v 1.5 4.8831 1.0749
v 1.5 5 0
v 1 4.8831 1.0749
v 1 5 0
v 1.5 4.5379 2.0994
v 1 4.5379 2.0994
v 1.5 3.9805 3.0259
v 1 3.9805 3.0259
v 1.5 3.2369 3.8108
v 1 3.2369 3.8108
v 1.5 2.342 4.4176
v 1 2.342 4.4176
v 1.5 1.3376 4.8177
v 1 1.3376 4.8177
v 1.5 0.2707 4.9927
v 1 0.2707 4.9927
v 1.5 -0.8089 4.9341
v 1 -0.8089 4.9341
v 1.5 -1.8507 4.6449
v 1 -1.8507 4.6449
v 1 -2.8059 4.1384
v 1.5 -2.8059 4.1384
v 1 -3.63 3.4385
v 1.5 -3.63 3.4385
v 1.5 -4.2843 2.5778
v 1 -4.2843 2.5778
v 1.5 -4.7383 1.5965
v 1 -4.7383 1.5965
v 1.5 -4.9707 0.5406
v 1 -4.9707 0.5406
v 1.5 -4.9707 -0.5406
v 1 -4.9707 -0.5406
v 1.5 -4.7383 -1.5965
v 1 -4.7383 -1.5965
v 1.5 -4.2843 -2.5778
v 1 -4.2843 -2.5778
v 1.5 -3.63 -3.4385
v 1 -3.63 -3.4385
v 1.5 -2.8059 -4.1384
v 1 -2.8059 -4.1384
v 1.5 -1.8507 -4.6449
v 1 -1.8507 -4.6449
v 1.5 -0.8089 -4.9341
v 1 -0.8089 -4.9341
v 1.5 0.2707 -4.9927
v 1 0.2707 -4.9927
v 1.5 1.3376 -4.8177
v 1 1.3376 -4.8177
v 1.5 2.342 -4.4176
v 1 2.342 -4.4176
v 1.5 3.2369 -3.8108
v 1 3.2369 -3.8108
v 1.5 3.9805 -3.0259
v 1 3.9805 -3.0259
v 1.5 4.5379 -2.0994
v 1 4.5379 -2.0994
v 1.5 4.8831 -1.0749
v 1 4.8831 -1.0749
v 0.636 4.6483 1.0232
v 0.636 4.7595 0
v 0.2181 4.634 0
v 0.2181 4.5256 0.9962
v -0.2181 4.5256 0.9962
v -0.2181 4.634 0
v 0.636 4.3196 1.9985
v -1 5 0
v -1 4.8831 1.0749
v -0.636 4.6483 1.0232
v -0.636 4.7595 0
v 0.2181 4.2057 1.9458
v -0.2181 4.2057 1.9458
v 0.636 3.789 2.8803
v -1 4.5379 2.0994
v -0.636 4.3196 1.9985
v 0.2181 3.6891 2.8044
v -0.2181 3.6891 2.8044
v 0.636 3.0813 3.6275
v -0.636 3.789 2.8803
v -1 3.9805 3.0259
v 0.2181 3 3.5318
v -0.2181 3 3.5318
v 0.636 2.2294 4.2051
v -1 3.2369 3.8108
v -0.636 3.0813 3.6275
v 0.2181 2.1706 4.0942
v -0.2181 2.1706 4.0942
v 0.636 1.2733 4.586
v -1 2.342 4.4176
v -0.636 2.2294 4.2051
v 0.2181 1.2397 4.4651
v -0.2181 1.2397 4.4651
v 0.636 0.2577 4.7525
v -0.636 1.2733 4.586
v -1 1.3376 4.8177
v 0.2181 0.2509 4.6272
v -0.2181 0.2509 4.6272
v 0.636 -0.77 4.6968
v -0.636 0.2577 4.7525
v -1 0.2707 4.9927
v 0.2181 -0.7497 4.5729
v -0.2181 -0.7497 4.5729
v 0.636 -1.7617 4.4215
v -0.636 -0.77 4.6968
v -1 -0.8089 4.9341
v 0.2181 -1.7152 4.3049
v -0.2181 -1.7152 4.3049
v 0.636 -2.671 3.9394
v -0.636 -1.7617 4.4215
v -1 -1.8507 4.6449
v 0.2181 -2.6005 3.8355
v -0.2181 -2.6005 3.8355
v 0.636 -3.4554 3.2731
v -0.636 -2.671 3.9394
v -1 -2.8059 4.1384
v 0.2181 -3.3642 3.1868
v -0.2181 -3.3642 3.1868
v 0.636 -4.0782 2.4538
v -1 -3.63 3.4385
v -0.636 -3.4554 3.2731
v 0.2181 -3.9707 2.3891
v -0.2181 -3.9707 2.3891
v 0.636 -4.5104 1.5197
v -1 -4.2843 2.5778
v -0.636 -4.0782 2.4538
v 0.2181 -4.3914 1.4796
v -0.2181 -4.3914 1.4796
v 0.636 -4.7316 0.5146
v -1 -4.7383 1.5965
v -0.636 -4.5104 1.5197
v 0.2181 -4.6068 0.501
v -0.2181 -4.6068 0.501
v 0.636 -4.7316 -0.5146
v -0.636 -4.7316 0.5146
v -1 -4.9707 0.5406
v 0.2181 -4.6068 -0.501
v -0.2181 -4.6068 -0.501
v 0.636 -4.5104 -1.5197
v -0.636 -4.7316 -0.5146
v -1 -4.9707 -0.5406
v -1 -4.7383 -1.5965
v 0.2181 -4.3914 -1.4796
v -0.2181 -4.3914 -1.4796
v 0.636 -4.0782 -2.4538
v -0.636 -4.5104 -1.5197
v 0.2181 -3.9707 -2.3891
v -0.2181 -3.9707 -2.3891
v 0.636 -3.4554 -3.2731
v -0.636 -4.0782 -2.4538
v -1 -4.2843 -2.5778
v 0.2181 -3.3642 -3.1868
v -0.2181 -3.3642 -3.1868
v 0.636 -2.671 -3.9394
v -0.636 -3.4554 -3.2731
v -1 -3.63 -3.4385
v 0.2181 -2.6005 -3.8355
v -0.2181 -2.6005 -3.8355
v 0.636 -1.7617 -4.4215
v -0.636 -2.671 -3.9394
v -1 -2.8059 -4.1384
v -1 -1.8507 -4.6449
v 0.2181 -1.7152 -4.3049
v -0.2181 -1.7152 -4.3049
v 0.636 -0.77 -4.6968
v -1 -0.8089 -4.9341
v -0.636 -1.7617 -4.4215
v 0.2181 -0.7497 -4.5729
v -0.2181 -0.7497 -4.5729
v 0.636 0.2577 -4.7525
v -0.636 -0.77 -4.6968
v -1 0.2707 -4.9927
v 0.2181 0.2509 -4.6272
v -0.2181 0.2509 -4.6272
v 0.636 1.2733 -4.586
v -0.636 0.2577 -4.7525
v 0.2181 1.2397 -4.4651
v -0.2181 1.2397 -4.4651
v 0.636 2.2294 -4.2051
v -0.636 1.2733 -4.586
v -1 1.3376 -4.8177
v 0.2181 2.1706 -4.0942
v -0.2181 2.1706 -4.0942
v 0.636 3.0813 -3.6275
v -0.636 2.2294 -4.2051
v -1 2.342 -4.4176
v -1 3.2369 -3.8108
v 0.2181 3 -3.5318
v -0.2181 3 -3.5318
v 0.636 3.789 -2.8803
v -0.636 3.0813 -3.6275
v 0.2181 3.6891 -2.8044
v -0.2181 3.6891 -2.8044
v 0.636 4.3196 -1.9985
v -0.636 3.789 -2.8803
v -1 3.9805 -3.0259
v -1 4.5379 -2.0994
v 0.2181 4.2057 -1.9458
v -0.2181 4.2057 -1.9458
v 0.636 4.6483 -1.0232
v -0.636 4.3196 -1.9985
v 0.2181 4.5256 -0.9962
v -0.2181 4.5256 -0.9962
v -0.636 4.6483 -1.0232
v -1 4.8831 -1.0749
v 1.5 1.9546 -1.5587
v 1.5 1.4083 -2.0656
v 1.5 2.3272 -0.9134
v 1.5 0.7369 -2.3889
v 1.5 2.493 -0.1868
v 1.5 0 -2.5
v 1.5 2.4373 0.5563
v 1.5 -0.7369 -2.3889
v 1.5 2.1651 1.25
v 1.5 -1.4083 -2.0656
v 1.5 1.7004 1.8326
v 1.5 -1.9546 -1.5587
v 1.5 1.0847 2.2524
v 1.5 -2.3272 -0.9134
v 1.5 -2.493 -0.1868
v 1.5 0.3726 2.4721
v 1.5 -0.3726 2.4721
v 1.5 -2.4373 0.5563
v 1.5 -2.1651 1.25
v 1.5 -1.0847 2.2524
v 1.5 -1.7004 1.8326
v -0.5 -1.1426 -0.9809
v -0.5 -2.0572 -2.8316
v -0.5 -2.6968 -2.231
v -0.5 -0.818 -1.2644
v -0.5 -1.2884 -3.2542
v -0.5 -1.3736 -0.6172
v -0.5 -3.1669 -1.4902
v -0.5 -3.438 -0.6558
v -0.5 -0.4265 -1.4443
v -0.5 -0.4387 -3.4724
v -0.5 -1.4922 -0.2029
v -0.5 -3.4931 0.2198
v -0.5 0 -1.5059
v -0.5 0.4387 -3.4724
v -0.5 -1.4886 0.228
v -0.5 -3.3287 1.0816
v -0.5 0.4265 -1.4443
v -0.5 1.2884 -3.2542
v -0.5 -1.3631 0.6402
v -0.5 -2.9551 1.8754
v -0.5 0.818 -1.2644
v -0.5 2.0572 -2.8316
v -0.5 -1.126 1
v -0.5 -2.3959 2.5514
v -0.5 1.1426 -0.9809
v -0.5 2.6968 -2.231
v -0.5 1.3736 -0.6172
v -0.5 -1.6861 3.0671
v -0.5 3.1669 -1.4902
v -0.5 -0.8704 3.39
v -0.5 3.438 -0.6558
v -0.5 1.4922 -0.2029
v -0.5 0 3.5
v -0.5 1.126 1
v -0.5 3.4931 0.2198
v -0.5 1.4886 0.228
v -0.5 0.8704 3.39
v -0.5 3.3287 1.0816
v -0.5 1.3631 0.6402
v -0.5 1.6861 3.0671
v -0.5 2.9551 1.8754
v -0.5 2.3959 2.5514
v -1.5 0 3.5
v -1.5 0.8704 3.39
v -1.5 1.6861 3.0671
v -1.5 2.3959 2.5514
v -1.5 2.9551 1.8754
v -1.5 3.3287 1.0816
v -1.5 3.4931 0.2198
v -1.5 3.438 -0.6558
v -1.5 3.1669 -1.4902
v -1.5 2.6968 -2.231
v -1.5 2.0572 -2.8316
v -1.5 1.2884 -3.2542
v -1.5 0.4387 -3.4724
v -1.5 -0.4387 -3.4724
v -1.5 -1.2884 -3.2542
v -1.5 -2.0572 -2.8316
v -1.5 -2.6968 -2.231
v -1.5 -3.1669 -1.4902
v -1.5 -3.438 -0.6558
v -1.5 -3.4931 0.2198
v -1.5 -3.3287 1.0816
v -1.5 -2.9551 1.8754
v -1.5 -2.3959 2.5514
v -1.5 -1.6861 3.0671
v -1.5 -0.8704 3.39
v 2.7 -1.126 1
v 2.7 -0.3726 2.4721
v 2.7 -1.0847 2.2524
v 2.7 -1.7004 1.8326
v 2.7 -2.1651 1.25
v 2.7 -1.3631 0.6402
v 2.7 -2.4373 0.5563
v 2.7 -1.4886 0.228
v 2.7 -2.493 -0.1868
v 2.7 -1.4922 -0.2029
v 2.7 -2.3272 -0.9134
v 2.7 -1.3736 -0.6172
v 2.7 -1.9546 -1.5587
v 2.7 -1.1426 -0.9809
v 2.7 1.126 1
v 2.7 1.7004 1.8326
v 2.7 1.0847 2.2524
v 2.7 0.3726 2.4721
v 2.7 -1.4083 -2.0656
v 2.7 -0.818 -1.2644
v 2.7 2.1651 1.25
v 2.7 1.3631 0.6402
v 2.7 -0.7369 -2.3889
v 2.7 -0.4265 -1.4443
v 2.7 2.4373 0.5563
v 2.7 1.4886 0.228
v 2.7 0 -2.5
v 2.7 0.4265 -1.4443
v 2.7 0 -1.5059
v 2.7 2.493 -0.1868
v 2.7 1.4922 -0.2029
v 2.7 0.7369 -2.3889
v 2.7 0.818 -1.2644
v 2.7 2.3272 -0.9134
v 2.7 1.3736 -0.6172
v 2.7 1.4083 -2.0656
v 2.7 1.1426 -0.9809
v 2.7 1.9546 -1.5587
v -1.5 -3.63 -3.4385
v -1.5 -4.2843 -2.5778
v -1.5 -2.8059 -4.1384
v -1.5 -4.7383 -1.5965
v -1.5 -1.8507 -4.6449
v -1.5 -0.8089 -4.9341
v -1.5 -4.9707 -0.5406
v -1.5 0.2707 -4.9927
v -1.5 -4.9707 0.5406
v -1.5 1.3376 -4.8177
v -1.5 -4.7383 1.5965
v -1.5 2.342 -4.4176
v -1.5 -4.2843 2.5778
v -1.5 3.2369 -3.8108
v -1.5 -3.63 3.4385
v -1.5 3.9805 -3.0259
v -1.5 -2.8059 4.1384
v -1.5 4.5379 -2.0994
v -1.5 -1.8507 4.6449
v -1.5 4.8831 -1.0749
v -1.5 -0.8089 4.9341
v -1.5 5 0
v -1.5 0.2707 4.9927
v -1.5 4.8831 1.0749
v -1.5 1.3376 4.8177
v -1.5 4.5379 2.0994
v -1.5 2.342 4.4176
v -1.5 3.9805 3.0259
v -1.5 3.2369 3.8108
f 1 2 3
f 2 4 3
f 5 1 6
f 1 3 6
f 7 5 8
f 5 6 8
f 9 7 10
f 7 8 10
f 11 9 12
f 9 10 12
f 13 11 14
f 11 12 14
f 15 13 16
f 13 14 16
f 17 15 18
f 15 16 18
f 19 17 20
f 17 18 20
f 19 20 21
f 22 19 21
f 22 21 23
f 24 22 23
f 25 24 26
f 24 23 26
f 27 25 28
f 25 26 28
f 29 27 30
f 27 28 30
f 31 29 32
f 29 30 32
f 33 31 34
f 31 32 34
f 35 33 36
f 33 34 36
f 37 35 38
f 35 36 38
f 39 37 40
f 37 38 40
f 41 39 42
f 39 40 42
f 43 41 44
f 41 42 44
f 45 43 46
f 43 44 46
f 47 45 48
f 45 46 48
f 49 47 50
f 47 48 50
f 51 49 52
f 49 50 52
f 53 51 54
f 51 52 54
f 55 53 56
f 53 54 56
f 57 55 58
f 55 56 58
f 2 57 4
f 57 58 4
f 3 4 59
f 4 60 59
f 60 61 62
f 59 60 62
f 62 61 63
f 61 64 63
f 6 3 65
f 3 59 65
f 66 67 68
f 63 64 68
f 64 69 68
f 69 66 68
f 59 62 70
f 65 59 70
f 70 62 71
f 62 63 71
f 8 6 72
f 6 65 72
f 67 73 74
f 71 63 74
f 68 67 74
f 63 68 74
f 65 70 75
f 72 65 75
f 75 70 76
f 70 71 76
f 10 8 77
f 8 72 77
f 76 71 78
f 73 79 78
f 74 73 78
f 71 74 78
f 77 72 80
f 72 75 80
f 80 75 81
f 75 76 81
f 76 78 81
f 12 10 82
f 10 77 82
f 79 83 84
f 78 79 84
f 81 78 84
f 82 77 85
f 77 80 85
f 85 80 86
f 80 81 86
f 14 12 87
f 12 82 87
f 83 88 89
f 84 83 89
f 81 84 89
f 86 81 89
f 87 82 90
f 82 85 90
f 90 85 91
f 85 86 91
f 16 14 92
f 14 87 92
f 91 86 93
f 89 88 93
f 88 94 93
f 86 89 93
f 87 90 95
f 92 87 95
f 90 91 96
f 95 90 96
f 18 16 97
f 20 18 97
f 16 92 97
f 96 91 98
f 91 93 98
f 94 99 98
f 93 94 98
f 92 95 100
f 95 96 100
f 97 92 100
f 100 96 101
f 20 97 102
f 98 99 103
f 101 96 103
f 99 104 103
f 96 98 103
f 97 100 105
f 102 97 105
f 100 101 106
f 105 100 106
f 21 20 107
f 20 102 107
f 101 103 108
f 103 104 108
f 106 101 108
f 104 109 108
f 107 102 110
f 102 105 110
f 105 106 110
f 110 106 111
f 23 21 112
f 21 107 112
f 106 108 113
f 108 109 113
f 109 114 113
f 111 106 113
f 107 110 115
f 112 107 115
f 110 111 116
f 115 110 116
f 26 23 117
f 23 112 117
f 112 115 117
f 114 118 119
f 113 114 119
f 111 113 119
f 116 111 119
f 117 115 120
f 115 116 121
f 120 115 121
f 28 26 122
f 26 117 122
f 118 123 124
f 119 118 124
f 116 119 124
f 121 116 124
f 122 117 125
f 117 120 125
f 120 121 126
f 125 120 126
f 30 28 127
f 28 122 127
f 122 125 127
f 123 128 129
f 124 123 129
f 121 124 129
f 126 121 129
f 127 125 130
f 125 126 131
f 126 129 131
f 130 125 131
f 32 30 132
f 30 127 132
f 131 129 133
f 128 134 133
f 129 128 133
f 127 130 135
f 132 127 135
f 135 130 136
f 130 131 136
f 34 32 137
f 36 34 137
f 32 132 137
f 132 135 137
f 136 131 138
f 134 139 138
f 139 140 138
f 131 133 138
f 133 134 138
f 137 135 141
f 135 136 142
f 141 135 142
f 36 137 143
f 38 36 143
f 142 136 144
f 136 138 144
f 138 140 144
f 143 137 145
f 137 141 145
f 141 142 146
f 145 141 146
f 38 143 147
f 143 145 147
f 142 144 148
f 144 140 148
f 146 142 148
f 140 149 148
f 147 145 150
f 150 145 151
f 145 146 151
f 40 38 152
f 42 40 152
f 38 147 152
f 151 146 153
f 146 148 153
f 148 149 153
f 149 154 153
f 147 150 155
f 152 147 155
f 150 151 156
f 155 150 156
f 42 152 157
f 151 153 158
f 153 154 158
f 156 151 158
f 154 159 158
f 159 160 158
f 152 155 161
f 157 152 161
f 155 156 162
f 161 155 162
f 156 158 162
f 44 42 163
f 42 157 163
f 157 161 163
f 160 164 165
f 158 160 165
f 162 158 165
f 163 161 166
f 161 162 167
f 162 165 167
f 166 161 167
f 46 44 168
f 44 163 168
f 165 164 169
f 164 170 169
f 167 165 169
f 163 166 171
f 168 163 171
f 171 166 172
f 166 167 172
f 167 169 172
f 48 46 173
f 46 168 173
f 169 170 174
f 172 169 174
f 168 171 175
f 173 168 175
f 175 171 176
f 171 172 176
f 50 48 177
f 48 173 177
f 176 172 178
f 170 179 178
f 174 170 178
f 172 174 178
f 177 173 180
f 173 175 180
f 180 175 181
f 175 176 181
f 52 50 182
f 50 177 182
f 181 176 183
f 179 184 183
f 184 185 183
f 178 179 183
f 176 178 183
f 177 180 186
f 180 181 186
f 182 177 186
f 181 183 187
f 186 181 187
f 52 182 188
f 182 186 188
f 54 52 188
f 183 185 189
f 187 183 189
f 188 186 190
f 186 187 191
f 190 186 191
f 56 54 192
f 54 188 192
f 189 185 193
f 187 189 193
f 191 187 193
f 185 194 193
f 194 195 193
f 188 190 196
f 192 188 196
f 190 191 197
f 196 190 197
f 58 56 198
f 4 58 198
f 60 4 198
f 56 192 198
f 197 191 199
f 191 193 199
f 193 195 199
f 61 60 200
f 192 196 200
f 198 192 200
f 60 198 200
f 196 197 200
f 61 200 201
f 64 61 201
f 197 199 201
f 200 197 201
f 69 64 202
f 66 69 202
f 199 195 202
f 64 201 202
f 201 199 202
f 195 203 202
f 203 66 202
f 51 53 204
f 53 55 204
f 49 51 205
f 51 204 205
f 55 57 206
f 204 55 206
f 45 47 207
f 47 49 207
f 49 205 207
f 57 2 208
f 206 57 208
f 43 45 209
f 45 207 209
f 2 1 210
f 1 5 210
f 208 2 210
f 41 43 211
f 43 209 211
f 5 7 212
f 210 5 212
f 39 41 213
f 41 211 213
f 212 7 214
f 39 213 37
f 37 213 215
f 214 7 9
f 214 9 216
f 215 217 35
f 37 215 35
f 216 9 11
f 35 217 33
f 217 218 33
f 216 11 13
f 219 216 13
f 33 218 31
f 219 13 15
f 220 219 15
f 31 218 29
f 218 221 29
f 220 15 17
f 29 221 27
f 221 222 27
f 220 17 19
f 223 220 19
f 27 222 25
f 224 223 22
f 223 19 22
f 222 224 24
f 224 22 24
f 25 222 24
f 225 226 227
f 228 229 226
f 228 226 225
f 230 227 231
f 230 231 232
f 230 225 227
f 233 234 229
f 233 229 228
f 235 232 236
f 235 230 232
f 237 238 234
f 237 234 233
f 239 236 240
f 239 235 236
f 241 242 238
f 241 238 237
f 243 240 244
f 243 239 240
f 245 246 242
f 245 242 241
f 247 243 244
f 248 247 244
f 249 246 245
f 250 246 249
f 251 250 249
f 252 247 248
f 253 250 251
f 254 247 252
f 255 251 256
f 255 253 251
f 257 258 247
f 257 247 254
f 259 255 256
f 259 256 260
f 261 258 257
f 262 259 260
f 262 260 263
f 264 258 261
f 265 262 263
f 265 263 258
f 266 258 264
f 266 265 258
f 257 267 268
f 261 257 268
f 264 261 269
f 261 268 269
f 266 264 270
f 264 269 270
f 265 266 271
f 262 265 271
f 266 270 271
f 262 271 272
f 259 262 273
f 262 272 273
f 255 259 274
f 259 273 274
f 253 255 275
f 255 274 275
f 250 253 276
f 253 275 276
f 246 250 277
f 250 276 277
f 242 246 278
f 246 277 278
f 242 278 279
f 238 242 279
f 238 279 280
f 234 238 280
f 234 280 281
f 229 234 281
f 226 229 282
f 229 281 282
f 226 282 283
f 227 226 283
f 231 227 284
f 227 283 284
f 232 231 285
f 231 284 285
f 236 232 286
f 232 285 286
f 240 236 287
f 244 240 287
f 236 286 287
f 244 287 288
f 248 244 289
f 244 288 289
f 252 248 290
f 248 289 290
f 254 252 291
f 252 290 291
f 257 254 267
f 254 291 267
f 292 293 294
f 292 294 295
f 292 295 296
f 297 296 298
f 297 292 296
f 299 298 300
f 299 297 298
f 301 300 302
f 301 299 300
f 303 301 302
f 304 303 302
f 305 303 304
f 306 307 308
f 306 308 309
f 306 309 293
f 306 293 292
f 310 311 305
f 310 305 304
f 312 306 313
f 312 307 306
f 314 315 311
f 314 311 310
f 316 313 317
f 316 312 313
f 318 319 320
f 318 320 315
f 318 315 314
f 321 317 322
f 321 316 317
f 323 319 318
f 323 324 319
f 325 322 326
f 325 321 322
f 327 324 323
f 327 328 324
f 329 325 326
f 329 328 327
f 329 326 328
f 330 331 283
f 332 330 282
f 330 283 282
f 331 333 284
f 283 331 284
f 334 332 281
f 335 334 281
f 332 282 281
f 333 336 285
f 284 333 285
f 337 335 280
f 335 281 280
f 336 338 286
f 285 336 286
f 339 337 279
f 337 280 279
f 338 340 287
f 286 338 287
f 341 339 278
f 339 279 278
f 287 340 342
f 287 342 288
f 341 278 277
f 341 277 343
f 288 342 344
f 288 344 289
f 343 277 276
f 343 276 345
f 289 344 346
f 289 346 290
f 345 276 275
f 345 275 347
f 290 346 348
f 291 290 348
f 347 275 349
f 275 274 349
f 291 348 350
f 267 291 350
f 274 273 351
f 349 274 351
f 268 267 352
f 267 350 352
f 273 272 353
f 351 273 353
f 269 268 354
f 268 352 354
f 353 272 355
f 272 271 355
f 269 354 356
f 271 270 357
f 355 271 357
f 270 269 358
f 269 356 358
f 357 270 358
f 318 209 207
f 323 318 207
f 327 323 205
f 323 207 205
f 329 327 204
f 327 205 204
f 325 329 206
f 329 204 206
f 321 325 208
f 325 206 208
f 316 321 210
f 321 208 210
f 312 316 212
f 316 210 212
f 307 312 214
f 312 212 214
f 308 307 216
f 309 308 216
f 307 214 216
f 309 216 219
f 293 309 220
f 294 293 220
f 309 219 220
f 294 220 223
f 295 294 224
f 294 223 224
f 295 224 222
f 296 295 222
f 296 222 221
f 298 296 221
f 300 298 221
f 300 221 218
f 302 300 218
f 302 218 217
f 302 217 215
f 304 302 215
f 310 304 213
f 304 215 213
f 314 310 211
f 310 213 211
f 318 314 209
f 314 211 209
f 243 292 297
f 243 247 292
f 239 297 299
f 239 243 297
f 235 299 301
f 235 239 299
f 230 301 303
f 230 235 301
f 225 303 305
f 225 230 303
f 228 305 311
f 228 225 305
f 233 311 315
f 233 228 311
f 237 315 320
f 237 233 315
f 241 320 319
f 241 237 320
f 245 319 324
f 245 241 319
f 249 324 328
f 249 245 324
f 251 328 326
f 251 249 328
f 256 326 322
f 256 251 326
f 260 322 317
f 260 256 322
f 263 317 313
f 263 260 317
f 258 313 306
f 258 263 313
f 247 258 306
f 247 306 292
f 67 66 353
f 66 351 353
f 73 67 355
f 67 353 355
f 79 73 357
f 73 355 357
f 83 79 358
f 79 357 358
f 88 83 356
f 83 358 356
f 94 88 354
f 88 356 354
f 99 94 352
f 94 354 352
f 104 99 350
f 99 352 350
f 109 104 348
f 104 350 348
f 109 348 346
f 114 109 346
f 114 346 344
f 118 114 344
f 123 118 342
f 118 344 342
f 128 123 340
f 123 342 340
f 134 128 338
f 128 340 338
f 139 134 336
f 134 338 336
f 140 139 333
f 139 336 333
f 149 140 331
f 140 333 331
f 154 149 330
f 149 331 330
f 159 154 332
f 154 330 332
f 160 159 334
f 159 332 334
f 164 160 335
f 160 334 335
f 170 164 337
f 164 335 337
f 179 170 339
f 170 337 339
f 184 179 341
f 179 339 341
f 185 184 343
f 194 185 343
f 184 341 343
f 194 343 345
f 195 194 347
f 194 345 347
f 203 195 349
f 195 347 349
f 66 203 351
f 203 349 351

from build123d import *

# Parameters (mm, degrees)
SKETCH7_R               = 2.5
BOSS_EXTRUDE1_DEPTH     = 1.2
CUT_EXTRUDE1_DEPTH      = 2.2
CUT_EXTRUDE1_DEPTH_BACK = 4
SKETCH9_R               = 3.5
CUT_EXTRUDE2_DEPTH      = 1


with BuildPart() as part:
    # Sketch3 → Revolve1 (revolve)
    with BuildSketch(Plane.XY):
        with BuildLine():
            Line((-1.5, 0), (1.5, 0))
            Line((1.5, 0), (1.5, 5))
            Line((1.5, 5), (1, 5))
            ThreePointArc((1, 5), (0, 4.618033989), (-1, 5))
            Line((-1, 5), (-1.5, 5))
            Line((-1.5, 5), (-1.5, 0))
        make_face()
    revolve(axis=Axis((0, 0, 0), (1, 0, 0)))

    # Sketch7 → Boss-Extrude1 (add)
    with BuildSketch(Plane(origin=(1.5, 0, 0), x_dir=(0, 0, -1), z_dir=(1, 0, 0))):
        Circle(SKETCH7_R)
    extrude(amount=BOSS_EXTRUDE1_DEPTH)

    # Sketch5 → Cut-Extrude1 (cut, two sides)
    with BuildSketch(Plane(origin=(1.5, 0, 0), x_dir=(0, 0, -1), z_dir=(1, 0, 0))) as cut_extrude1_sk:
        with BuildLine():
            Line((-1, 1.125953933), (-1, -1.125953933))
            ThreePointArc((-1, -1.125953933), (1.505912434, 0), (-1, 1.125953933))
        make_face()
    extrude(amount=CUT_EXTRUDE1_DEPTH, mode=Mode.SUBTRACT)
    extrude(cut_extrude1_sk.sketch, amount=-CUT_EXTRUDE1_DEPTH_BACK, mode=Mode.SUBTRACT)

    # Sketch9 → Cut-Extrude2 (cut)
    with BuildSketch(Plane.ZY.offset(1.5)):
        Circle(SKETCH9_R)
    extrude(amount=-CUT_EXTRUDE2_DEPTH, mode=Mode.SUBTRACT)


solid = part.part
